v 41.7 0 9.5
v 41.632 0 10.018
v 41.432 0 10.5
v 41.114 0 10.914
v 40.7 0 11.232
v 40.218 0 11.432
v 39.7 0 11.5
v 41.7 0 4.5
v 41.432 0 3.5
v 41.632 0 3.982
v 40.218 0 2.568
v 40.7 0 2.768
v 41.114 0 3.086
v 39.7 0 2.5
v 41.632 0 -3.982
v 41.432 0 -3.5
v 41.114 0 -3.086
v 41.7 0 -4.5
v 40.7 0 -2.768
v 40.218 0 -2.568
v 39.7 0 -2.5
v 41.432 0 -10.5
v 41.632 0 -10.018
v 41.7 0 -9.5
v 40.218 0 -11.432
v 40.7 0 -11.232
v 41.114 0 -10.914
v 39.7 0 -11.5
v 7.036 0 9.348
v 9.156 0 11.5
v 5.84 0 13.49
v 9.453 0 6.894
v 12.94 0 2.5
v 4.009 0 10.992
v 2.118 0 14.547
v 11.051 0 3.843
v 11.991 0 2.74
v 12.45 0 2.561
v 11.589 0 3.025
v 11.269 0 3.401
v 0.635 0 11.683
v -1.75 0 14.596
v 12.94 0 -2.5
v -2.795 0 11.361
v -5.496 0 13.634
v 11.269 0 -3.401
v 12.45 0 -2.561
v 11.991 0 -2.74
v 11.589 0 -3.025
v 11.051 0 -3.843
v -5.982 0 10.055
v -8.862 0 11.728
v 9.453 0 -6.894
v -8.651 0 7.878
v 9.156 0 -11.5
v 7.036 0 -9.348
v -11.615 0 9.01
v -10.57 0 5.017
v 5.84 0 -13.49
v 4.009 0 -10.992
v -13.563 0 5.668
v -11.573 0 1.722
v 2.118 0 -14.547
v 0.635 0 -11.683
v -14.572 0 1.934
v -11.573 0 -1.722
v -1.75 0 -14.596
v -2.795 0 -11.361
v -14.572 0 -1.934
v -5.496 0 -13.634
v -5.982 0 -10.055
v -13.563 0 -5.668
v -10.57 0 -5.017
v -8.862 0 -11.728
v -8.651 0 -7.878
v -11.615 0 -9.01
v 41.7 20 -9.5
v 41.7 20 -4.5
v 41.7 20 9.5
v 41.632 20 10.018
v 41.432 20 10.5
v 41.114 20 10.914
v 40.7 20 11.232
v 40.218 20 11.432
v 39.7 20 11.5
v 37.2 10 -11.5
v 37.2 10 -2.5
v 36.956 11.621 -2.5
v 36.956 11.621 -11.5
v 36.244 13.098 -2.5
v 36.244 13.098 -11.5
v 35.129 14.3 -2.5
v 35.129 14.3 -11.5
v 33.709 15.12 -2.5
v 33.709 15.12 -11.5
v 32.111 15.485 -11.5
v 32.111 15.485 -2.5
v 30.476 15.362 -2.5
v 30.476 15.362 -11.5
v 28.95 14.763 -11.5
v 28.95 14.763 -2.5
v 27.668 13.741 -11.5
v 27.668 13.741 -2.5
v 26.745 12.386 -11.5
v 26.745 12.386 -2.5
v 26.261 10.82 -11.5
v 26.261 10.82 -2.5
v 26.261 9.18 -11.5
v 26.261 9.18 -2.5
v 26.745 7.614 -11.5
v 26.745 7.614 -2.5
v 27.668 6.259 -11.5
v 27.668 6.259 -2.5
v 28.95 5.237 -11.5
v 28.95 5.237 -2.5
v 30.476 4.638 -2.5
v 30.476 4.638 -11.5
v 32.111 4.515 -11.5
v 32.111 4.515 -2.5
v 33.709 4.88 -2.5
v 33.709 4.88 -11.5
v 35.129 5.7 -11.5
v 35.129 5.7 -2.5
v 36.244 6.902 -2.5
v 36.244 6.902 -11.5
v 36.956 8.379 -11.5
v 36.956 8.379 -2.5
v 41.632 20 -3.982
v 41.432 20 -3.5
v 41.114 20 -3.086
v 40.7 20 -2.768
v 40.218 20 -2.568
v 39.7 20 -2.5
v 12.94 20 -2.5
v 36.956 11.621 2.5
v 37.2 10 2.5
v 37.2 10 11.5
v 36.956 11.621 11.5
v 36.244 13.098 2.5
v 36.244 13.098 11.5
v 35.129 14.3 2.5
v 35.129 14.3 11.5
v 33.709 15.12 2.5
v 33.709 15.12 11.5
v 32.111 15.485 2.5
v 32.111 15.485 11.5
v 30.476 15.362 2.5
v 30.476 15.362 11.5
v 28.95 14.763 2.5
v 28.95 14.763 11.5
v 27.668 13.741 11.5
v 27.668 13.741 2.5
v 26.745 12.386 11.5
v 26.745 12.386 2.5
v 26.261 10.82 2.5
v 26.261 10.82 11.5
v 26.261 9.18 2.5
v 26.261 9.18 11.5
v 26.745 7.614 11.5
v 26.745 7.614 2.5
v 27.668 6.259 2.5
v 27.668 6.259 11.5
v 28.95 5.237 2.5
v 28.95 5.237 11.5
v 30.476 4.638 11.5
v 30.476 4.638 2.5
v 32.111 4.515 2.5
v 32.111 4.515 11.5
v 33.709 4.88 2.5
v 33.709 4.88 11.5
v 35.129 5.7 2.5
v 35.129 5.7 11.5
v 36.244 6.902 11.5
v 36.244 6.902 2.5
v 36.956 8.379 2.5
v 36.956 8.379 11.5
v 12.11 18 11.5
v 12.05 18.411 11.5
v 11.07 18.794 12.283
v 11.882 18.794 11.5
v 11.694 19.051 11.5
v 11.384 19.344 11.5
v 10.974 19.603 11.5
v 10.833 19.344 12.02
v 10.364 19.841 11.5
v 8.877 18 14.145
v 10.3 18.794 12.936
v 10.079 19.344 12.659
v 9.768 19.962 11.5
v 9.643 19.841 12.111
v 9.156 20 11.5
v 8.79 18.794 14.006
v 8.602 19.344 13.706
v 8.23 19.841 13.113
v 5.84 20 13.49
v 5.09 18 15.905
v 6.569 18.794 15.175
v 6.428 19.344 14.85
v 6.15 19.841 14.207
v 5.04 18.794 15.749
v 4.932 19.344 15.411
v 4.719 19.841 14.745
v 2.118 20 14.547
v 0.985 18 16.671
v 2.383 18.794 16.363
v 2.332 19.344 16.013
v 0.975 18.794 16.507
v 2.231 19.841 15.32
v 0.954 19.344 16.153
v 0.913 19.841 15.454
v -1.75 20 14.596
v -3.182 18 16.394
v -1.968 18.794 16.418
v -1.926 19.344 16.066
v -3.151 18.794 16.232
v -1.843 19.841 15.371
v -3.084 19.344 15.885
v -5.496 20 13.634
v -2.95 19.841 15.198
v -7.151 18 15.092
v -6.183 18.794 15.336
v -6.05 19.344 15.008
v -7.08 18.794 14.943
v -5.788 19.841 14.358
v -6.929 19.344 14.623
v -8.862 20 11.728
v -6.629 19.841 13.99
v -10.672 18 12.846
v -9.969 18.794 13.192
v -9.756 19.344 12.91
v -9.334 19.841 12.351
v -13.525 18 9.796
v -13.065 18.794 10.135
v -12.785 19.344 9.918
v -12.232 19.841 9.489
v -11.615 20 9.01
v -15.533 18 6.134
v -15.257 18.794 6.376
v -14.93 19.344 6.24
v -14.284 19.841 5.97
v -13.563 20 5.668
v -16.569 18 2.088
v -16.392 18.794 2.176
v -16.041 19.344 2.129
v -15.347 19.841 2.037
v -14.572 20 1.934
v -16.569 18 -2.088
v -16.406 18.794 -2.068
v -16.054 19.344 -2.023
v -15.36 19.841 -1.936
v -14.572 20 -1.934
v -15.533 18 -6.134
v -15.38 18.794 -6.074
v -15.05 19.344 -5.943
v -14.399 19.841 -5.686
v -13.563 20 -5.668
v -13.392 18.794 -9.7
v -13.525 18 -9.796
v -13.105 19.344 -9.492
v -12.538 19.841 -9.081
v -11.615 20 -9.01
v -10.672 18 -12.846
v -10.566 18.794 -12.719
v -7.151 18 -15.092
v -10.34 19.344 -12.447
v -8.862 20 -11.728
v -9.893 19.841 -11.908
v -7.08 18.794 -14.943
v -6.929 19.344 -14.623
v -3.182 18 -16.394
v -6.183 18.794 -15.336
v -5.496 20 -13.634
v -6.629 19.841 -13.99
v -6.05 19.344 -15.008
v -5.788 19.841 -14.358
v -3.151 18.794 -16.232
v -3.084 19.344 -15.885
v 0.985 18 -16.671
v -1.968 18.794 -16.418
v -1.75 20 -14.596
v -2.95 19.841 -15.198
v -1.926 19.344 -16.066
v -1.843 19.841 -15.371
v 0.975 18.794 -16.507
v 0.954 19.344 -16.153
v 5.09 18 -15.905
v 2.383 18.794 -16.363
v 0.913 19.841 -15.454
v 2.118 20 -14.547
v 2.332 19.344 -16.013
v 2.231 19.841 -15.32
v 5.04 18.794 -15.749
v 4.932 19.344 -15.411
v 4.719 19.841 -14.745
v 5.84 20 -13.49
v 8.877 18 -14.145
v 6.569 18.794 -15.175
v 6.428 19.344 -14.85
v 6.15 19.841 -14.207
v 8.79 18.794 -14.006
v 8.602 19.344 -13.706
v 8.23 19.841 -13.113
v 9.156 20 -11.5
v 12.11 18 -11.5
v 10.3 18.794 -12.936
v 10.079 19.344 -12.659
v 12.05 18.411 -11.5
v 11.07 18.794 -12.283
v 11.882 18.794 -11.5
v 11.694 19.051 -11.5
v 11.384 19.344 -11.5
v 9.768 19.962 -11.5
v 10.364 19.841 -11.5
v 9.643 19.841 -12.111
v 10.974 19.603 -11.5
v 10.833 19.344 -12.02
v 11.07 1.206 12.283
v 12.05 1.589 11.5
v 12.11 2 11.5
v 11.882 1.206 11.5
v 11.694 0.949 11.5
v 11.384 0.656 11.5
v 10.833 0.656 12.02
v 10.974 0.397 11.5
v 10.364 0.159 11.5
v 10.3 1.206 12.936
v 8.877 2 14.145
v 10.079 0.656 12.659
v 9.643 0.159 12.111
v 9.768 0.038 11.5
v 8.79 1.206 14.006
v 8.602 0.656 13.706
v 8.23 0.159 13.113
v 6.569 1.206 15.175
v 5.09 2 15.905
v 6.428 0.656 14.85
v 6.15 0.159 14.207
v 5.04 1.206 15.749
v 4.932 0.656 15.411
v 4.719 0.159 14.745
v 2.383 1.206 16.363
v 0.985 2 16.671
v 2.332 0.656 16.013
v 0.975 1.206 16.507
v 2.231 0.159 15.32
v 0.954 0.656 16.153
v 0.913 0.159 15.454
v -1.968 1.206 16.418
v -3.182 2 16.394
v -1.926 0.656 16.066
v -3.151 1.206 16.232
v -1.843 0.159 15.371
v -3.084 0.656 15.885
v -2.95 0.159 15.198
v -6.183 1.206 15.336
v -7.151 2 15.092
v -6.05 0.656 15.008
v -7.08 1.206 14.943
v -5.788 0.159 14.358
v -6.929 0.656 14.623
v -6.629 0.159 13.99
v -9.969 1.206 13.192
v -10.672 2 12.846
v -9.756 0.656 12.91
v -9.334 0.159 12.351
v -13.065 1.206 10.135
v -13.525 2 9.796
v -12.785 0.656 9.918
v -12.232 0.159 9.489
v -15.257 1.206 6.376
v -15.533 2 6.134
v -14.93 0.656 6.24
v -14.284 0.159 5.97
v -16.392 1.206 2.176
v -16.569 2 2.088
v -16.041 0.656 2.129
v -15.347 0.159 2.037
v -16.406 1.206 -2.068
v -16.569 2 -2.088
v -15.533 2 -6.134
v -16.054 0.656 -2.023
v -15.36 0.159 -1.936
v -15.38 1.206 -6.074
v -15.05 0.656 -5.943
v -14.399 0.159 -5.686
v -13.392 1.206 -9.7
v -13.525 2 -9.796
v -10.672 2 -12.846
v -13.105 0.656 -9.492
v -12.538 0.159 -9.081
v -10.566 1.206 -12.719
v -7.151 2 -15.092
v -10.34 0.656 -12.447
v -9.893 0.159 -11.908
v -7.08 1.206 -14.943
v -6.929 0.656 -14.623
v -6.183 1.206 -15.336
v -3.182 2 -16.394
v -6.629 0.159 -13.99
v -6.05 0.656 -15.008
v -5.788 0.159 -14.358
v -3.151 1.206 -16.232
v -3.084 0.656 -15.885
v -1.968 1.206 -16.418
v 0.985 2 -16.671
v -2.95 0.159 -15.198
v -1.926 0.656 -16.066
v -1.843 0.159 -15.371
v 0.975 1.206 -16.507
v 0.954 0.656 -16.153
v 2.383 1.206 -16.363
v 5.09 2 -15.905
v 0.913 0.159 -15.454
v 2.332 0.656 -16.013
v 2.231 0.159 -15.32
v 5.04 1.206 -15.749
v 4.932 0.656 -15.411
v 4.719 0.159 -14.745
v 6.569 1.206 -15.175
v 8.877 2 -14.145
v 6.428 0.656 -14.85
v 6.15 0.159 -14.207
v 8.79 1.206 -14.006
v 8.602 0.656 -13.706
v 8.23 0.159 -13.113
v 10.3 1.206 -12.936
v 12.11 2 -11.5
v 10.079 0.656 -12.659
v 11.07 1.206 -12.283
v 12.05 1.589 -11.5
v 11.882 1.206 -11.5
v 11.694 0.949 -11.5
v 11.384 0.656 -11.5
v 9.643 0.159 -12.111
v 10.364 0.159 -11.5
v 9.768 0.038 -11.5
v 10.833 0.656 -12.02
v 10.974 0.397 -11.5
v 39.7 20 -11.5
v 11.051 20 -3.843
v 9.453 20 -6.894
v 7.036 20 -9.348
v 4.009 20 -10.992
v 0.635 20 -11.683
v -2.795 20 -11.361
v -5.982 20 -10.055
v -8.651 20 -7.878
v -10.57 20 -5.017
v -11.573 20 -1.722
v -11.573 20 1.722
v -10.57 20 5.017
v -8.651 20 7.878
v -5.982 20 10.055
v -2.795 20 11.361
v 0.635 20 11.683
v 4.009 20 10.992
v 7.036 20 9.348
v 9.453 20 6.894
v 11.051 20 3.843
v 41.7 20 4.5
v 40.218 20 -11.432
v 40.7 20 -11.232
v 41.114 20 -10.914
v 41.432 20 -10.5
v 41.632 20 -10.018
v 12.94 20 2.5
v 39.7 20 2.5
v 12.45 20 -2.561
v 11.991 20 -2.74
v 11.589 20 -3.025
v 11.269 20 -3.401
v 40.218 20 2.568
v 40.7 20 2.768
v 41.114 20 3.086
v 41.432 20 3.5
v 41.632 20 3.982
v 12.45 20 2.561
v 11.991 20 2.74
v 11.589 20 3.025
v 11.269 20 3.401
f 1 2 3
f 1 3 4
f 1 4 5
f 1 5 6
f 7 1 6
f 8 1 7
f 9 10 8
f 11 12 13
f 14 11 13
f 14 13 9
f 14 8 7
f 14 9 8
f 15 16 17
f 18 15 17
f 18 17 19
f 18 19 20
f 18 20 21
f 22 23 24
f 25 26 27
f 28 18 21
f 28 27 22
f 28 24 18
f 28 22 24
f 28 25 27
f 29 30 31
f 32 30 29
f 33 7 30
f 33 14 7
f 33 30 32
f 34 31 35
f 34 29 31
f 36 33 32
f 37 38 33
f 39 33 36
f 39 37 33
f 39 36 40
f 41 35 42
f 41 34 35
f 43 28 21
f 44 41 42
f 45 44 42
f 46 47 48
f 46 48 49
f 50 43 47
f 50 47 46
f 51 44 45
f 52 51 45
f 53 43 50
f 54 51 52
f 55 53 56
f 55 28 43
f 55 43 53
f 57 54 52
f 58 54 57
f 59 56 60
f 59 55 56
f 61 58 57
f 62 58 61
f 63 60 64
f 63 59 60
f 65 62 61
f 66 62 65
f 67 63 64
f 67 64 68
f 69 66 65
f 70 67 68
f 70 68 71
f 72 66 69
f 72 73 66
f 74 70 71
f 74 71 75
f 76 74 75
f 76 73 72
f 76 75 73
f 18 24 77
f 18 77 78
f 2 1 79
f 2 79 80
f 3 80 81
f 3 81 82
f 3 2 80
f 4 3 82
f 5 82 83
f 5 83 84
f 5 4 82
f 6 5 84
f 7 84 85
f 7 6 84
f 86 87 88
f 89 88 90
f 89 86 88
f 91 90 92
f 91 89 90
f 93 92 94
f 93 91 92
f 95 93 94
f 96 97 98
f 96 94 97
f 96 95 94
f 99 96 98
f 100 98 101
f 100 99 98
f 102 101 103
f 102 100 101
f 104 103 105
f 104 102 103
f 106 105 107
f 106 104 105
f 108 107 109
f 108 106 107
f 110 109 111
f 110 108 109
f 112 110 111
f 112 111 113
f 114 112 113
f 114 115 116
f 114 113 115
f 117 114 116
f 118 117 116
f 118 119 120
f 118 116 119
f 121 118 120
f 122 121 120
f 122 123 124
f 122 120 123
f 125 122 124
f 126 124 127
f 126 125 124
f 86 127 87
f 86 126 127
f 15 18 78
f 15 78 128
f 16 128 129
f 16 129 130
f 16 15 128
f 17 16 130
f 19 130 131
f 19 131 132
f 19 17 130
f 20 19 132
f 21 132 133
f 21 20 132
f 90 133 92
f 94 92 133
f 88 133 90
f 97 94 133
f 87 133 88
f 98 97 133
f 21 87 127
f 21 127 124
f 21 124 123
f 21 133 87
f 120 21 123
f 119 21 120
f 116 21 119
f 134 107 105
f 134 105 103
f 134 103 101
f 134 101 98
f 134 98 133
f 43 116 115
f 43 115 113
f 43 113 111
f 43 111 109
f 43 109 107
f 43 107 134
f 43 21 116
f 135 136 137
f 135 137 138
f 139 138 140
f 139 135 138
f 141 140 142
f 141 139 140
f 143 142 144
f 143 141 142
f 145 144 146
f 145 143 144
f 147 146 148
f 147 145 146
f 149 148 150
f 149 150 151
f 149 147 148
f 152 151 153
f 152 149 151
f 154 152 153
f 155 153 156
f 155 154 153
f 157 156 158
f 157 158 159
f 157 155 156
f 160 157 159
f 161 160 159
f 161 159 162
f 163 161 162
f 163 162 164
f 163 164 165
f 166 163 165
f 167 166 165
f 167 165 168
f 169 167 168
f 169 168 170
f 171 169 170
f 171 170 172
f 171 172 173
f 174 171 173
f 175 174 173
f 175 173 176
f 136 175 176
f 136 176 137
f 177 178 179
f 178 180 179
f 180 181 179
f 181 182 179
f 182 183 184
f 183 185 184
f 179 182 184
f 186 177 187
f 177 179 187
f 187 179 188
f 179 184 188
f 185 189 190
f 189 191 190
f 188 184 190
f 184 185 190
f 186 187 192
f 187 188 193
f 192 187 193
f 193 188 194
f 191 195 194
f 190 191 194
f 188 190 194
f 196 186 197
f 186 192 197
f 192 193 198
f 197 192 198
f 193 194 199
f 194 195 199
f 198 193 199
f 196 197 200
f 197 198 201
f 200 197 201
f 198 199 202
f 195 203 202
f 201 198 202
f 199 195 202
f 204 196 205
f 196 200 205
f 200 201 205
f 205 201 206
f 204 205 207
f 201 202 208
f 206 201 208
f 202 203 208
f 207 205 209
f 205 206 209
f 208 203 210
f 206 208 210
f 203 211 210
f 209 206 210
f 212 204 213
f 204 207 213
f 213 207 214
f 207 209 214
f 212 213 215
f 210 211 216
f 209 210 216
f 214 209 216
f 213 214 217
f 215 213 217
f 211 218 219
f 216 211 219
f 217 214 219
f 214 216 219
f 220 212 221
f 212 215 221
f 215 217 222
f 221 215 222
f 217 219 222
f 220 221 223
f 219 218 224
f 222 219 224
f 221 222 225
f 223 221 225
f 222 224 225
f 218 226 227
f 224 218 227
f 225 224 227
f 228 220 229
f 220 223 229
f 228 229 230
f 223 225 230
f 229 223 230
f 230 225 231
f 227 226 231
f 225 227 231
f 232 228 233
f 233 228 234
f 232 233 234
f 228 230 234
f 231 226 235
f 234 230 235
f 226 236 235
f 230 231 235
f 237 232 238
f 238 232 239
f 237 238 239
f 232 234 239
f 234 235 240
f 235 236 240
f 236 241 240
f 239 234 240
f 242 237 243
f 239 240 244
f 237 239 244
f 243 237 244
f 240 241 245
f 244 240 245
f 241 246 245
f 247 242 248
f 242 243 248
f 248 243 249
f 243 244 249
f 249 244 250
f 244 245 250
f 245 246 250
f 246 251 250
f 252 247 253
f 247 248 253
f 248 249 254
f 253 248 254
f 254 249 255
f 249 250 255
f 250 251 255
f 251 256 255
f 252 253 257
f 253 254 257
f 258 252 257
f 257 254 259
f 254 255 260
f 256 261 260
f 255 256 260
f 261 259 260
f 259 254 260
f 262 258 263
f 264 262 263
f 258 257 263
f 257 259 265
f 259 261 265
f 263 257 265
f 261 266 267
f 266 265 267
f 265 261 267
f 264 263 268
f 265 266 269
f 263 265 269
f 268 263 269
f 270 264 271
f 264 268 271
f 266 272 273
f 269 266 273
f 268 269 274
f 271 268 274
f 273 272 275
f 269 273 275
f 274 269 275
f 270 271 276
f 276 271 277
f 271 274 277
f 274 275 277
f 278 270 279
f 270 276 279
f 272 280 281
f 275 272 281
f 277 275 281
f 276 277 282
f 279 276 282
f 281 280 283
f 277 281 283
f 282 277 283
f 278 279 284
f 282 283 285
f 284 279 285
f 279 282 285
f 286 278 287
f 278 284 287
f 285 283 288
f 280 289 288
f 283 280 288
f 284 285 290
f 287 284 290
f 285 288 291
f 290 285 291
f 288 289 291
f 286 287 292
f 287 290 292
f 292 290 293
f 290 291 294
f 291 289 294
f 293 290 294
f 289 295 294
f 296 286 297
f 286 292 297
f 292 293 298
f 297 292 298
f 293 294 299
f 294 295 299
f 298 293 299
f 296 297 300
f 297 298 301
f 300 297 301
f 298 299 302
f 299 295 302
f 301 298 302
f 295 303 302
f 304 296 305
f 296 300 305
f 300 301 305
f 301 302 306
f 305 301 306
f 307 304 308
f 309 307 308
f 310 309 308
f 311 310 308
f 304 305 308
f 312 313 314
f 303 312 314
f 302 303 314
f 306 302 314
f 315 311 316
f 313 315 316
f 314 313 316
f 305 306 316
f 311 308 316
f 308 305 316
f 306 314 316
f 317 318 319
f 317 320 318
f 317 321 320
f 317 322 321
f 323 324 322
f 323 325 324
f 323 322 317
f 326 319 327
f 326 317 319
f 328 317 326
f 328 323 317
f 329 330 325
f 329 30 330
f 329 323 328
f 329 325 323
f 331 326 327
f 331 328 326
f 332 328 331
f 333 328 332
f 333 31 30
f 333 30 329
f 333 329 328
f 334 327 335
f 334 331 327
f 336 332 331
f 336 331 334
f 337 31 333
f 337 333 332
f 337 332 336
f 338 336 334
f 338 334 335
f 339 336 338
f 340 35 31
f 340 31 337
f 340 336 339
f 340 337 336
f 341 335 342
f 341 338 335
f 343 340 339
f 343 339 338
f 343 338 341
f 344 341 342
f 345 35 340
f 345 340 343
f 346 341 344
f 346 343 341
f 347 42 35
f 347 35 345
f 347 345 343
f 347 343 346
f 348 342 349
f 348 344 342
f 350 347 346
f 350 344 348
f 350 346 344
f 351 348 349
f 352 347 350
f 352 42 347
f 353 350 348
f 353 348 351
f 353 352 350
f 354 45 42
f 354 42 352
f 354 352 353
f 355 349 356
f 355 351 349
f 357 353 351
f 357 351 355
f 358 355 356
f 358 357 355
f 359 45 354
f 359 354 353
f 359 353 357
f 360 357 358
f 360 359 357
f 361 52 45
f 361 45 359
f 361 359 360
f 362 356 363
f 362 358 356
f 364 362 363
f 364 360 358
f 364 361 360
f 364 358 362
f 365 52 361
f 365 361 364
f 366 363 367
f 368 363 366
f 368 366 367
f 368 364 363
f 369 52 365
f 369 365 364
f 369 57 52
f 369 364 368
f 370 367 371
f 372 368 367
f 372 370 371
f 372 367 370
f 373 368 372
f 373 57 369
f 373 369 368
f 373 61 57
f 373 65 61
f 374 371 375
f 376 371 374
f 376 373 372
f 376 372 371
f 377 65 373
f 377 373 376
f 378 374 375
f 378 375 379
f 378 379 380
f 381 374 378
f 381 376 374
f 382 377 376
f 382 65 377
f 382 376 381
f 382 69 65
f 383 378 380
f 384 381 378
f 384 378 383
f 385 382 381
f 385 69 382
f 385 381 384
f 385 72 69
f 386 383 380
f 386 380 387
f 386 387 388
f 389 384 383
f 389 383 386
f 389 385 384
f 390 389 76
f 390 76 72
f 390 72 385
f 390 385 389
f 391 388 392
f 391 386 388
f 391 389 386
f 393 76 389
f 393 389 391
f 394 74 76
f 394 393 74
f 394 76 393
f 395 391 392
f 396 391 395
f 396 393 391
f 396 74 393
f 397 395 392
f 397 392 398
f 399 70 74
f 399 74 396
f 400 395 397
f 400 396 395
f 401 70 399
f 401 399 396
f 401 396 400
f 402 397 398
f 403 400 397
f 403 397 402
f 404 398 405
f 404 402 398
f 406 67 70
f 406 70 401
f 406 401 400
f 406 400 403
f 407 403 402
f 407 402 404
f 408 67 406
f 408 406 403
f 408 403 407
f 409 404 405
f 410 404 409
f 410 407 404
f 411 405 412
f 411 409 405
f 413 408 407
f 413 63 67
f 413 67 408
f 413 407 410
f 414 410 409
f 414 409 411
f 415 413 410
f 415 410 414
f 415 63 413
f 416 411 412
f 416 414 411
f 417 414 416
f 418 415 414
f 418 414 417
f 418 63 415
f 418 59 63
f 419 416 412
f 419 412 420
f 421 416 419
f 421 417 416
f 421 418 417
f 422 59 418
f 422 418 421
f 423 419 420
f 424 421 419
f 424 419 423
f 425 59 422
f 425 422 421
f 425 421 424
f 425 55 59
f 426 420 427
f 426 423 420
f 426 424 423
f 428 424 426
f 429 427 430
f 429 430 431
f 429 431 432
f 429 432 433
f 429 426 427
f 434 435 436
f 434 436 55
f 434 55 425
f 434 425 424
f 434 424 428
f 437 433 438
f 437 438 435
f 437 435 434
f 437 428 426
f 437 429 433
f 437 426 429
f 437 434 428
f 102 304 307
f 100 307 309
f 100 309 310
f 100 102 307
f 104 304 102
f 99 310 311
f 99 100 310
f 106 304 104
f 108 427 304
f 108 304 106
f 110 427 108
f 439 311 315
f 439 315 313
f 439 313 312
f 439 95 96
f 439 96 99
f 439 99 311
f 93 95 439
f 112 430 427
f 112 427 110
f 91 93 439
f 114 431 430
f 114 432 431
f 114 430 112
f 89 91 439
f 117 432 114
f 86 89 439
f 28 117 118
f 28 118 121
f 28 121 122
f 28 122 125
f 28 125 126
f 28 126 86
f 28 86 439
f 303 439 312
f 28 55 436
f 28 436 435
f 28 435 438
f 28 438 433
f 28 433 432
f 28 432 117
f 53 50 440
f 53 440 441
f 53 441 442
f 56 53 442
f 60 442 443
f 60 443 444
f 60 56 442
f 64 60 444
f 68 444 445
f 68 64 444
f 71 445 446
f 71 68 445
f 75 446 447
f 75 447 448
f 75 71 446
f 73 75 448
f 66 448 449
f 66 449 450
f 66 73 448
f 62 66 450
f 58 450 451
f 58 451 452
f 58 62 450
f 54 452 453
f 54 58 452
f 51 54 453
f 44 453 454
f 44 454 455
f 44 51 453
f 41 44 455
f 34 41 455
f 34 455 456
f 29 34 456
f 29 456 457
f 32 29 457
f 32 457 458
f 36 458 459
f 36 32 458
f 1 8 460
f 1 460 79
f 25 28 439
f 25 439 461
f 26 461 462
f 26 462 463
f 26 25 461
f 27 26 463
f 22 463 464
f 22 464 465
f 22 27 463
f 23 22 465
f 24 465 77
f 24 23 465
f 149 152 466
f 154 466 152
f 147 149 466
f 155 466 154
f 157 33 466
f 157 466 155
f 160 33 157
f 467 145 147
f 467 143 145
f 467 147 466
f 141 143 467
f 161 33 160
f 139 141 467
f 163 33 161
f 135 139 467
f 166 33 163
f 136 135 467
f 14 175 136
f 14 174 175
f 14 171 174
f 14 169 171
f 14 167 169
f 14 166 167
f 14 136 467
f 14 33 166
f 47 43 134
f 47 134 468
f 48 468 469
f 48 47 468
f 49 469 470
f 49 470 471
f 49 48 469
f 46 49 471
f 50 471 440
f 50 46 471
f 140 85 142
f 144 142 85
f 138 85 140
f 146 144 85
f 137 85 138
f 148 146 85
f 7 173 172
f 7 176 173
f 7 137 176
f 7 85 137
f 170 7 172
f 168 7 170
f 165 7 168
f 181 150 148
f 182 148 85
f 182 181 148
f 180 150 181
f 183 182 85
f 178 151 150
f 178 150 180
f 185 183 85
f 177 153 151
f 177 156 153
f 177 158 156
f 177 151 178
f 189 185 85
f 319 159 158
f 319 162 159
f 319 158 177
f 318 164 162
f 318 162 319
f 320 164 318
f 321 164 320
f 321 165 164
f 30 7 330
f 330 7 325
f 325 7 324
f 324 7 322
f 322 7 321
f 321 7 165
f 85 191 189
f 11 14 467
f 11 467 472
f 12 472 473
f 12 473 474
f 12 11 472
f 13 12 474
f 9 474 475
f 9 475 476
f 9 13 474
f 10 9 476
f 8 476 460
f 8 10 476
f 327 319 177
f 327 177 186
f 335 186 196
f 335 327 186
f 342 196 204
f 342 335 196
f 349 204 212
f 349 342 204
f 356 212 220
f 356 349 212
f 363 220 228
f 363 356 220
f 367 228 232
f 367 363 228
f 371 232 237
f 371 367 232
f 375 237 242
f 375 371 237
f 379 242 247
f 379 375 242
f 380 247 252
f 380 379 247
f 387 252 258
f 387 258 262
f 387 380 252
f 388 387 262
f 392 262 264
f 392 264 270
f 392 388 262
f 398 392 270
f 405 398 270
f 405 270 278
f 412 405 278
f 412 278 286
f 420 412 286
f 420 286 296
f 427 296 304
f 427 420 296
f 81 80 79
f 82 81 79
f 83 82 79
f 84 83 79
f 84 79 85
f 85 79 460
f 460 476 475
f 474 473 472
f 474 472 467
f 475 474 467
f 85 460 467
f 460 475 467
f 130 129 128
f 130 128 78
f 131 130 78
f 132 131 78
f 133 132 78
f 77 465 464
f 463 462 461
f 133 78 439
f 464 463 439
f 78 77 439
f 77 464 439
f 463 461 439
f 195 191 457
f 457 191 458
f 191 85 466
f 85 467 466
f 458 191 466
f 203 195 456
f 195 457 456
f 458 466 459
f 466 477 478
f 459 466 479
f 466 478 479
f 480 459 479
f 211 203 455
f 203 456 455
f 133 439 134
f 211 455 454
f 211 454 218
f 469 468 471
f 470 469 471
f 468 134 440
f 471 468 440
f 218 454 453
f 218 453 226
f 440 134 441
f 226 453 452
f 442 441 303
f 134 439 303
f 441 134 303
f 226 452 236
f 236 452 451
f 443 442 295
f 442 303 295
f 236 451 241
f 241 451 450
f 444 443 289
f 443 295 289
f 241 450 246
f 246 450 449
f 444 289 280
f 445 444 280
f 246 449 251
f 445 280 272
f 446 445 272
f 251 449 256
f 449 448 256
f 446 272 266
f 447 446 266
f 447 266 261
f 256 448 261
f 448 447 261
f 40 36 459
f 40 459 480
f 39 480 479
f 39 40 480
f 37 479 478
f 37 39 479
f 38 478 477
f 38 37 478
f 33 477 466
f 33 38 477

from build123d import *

# Parameters (mm, degrees)
DODANIE_WYCI_GNI_CIE1_DEPTH  = 20
ZAAWANSOWANYOTW_R1_START     = -11.5
ZAAWANSOWANYOTW_R1_OUTLINE_R = 5.5
ZAAWANSOWANYOTW_R1_DEPTH     = 23
ZAOKR_GLENIE3_R              = 2


# Read off the part's stored shape, not the designer's step: ZaawansowanyOtwór1
with BuildPart() as part:
    # Szkic1 → Dodanie-wyciągnięcie1 (new body)
    with BuildSketch(Plane(origin=(0, 0, 0), x_dir=(1, 0, 0), z_dir=(0, 1, 0))):
        with BuildLine():
            Line((12.109500403, 11.5), (39.7, 11.5))
            ThreePointArc((39.7, 11.5), (41.114213562, 10.914213562), (41.7, 9.5))
            Line((41.7, 9.5), (41.7, 4.5))
            ThreePointArc((41.7, 4.5), (41.114213562, 3.085786438), (39.7, 2.5))
            Line((39.7, 2.5), (13.774977314, 2.5))
            Line((13.774977314, 2.5), (12.939860896, 2.5))
            ThreePointArc((12.939860896, 2.5), (11.780953784, 2.869989477), (11.050830108, 3.843065693))
            ThreePointArc((11.050830108, 3.843065693), (-11.7, 0), (11.050830108, -3.843065693))
            ThreePointArc((11.050830108, -3.843065693), (11.780953784, -2.869989477), (12.939860896, -2.5))
            Line((12.939860896, -2.5), (13.774977314, -2.5))
            Line((13.774977314, -2.5), (39.7, -2.5))
            ThreePointArc((39.7, -2.5), (41.114213562, -3.085786438), (41.7, -4.5))
            Line((41.7, -4.5), (41.7, -9.5))
            ThreePointArc((41.7, -9.5), (41.114213562, -10.914213562), (39.7, -11.5))
            Line((39.7, -11.5), (12.109500403, -11.5))
            ThreePointArc((12.109500403, -11.5), (-16.7, 0), (12.109500403, 11.5))
        make_face()
    extrude(amount=DODANIE_WYCI_GNI_CIE1_DEPTH)

    # ZaawansowanyOtwór1 outline → ZaawansowanyOtwór1 (cut)
    with BuildSketch(Plane.XY.offset(ZAAWANSOWANYOTW_R1_START)):
        with Locations((31.7, 10)):
            Circle(ZAAWANSOWANYOTW_R1_OUTLINE_R)
    extrude(amount=ZAAWANSOWANYOTW_R1_DEPTH, mode=Mode.SUBTRACT)

    # Zaokrąglenie3
    zaokr_glenie3_edges = [part.edges().sort_by_distance(p)[0] for p in [
        (-16.7, 0, 0),
        (-16.7, 20, 0),
    ]]
    fillet(zaokr_glenie3_edges, radius=ZAOKR_GLENIE3_R)


solid = part.part
